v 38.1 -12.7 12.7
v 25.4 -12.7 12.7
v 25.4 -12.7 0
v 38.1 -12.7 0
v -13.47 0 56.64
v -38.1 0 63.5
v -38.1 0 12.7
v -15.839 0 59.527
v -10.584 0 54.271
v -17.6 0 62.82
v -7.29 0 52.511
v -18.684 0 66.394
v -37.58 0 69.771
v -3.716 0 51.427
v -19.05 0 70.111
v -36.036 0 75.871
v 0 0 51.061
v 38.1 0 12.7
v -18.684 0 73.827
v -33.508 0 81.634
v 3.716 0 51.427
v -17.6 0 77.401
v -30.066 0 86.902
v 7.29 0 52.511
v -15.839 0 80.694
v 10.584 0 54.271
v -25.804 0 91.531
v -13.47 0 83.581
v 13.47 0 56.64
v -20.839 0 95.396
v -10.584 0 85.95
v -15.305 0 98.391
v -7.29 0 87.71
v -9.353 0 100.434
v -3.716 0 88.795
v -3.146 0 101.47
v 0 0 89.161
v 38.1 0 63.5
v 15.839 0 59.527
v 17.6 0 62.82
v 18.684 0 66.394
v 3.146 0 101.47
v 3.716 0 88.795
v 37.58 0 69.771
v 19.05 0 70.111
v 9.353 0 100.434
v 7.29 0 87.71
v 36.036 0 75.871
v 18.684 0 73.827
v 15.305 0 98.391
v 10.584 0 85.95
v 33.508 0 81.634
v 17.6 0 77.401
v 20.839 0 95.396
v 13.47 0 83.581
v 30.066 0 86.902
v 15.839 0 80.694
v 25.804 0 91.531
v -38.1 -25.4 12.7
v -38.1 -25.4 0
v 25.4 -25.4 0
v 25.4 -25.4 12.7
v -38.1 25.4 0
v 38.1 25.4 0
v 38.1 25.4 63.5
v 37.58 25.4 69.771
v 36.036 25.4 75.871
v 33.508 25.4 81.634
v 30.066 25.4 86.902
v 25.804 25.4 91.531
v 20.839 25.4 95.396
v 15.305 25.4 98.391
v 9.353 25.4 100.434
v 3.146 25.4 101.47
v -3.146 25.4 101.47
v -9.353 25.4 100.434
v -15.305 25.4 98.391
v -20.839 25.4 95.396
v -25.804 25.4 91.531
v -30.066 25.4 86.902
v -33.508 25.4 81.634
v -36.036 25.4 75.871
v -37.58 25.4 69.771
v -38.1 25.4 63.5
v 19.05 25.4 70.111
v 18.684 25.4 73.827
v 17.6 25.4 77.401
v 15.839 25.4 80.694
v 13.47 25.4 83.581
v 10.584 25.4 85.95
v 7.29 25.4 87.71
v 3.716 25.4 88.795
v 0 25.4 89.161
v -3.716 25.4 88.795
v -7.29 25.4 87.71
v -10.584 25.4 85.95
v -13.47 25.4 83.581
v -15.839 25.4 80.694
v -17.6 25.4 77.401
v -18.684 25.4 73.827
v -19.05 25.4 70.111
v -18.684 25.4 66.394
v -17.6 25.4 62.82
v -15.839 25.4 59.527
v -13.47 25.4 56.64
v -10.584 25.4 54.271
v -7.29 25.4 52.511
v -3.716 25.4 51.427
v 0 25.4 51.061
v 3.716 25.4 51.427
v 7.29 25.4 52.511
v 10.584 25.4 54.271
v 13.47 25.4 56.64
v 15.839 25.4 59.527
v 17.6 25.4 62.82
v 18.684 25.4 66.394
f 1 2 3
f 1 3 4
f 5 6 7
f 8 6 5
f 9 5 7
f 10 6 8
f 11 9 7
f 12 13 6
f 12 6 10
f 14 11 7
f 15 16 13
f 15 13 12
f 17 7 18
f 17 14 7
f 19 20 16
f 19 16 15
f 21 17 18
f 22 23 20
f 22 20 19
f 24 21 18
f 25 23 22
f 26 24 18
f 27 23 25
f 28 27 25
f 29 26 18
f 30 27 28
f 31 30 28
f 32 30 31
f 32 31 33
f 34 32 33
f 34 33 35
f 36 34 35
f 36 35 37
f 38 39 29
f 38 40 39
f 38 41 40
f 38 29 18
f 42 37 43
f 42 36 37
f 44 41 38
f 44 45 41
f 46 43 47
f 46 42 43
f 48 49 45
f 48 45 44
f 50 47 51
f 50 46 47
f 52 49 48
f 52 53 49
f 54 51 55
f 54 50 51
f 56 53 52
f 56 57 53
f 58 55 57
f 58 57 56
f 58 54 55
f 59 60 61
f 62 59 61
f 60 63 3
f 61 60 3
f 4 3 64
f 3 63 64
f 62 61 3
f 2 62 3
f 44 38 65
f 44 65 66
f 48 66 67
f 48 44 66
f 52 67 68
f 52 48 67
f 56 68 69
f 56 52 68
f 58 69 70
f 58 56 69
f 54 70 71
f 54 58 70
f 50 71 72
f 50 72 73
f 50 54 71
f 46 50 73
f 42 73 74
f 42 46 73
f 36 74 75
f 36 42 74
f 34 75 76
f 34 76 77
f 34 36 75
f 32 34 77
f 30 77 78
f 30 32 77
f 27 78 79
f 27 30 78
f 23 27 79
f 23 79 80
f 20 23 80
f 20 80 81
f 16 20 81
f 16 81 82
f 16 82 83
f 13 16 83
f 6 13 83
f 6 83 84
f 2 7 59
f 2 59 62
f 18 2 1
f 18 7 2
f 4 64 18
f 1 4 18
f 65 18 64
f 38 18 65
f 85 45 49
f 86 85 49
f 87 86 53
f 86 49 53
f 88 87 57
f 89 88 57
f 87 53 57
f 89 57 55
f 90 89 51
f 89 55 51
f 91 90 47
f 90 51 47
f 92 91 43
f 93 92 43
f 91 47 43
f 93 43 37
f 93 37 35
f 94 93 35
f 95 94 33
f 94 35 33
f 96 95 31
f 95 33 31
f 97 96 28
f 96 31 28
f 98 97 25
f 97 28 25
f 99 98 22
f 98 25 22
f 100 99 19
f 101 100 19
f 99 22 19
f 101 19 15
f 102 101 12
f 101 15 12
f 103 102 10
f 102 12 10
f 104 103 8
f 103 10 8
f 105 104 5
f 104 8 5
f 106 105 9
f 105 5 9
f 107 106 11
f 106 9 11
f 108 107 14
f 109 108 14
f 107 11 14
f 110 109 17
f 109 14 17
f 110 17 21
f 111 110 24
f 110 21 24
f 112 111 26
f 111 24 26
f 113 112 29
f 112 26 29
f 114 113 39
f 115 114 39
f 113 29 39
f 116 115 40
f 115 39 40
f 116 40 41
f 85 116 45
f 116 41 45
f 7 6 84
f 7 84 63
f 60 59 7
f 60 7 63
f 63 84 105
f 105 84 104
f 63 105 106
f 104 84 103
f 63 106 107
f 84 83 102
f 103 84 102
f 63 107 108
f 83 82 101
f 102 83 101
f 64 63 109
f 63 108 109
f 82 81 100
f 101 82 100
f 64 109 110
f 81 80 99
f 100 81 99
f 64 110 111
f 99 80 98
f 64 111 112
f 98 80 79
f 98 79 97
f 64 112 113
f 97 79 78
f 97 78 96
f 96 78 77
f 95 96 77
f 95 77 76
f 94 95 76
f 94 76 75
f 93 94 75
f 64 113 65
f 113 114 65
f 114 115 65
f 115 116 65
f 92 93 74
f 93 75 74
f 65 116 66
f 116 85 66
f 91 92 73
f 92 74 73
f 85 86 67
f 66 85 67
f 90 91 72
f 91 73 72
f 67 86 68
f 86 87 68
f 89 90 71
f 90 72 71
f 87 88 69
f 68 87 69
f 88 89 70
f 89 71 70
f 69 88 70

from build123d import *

# Parameters (mm, degrees)
F0_W     = 76.2
F0_H     = 50.8
F1_DEPTH = 12.7
F2_W     = 12.7
F2_H     = 12.7
F3_DEPTH = 12.7
F5_DEPTH = 25.4
F6_R     = 19.05
F7_DEPTH = 25.4


with BuildPart() as f1:
    # F0 (on Top) → F1 (new body)
    with BuildSketch(Plane.XY):
        Rectangle(F0_W, F0_H)
    extrude(amount=F1_DEPTH)

    # F2 (on face) → F3 (cut)
    with BuildSketch(Plane.XY.offset(12.7)):
        with Locations((31.75, -19.05)):
            Rectangle(F2_W, F2_H)
    extrude(amount=-F3_DEPTH, mode=Mode.SUBTRACT)

    # F4 (on Front) → F5 (join)
    with BuildSketch(Plane.XZ):
        with BuildLine():
            Line((-38.1, 12.7), (38.1, 12.7))
            Line((38.1, 12.7), (38.1, 63.5))
            ThreePointArc((38.1, 63.5), (0, 25.4), (-38.1, 63.5))
            Line((-38.1, 63.5), (-38.1, 12.7))
        make_face()
        with BuildLine():
            ThreePointArc((-38.1, 63.5), (0, 25.4), (38.1, 63.5))
            Line((38.1, 63.5), (-38.1, 63.5))
        make_face()
        with BuildLine():
            Line((-38.1, 63.5), (38.1, 63.5))
            ThreePointArc((38.1, 63.5), (0, 101.6), (-38.1, 63.5))
        make_face()
    extrude(amount=-F5_DEPTH)

    # F6 (on face) → F7 (cut)
    with BuildSketch(Plane.XZ):
        with Locations((0, 70.110589)):
            Circle(F6_R)
    extrude(amount=-F7_DEPTH, mode=Mode.SUBTRACT)


solid = f1.part
